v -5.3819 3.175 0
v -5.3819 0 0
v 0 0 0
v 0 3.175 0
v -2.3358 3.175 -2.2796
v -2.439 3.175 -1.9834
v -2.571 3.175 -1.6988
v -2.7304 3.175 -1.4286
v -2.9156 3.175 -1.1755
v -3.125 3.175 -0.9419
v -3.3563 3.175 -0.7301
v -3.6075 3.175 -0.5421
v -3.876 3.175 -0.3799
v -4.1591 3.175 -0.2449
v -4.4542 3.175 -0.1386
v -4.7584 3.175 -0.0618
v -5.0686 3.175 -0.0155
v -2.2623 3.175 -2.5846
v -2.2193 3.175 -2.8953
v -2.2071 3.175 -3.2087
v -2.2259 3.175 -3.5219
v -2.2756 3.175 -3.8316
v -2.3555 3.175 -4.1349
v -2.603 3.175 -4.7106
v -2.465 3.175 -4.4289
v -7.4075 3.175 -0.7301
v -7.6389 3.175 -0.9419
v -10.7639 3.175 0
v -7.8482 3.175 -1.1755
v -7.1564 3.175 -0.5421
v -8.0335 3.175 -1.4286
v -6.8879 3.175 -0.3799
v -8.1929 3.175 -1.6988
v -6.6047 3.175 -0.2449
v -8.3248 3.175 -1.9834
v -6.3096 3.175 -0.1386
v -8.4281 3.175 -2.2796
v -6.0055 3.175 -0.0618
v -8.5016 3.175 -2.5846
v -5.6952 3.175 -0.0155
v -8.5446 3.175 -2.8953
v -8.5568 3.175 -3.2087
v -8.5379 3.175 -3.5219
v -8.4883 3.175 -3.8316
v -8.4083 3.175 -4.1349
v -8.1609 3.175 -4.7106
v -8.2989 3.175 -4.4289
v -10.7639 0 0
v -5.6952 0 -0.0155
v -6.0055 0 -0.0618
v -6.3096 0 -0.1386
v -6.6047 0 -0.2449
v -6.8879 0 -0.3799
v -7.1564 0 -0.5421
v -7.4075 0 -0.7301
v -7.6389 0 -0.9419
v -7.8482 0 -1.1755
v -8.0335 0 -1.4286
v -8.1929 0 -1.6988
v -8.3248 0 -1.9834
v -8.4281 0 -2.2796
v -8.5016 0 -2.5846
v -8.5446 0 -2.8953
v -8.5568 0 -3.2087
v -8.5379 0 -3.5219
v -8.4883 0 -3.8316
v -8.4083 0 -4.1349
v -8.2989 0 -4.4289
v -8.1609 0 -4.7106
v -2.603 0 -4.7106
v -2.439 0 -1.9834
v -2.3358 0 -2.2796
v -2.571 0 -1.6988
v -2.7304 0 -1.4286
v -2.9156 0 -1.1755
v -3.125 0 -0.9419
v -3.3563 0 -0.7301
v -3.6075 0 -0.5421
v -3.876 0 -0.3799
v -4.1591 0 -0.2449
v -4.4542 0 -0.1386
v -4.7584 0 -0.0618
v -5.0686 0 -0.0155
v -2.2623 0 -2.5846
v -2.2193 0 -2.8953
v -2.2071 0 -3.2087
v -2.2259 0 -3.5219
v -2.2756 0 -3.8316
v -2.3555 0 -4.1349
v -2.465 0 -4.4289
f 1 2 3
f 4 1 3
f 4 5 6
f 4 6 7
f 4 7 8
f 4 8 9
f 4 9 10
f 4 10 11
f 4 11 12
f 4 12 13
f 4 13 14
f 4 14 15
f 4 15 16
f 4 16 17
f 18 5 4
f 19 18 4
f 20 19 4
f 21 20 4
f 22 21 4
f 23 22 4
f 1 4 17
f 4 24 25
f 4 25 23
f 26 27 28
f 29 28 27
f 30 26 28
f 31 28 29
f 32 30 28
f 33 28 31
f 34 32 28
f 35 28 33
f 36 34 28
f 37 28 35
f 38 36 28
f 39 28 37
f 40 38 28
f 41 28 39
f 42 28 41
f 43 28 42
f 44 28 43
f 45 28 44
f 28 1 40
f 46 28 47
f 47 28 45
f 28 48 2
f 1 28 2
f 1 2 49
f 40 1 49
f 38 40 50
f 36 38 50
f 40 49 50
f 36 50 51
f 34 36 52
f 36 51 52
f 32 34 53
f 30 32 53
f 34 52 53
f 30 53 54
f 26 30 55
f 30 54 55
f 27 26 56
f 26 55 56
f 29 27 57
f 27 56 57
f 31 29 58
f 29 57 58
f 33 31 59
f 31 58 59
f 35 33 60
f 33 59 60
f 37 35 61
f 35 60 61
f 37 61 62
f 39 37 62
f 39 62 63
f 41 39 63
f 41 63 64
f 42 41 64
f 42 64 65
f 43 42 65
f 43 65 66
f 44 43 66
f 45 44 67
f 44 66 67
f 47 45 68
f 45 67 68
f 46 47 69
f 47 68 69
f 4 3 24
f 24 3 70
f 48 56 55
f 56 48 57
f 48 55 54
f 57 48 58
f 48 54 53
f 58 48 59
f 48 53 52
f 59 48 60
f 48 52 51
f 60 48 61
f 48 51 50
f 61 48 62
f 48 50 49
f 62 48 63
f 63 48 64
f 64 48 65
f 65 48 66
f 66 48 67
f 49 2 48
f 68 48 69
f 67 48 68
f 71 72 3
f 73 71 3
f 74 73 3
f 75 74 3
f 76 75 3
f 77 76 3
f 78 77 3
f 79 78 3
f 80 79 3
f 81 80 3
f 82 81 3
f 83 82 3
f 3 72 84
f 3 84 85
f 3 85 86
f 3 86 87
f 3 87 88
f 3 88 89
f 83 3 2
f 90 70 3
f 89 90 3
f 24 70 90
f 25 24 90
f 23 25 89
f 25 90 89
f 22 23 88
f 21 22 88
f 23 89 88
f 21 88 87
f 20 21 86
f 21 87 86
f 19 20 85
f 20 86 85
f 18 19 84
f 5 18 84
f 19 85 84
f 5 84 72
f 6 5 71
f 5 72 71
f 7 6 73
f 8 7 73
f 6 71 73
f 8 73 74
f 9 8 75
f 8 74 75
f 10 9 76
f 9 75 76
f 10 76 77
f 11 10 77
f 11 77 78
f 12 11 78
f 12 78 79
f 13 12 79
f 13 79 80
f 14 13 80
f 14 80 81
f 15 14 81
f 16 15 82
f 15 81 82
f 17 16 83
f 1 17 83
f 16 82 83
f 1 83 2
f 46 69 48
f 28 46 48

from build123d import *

# Parameters (mm, degrees)
BOSS_EXTRUDE1_DEPTH   = 3.175
BOSS_EXTRUDE1_2_DEPTH = 3.175


with BuildPart() as part:
    # Sketch1 → Boss-Extrude1 (new body)
    with BuildSketch(Plane(origin=(0, 0, 0), x_dir=(1, 0, 0), z_dir=(0, 1, 0))):
        with BuildLine():
            Line((-10.763873207, 0), (-5.381936603, 0))
            ThreePointArc((-5.381936603, 0), (-8.116542678, 1.561756492), (-8.160888098, 4.710595517))
            Line((-8.160888098, 4.710595517), (-10.763873207, 0))
        make_face()
    extrude(amount=BOSS_EXTRUDE1_DEPTH)


with BuildPart() as body_2:
    # Sketch1 → Boss-Extrude1 2 (new body)
    with BuildSketch(Plane(origin=(0, 0, 0), x_dir=(1, 0, 0), z_dir=(0, 1, 0))):
        with BuildLine():
            Line((-5.381936603, 0), (0, 0))
            Line((0, 0), (-2.602985109, 4.710595517))
            ThreePointArc((-2.602985109, 4.710595517), (-2.647330529, 1.561756492), (-5.381936603, 0))
        make_face()
    extrude(amount=BOSS_EXTRUDE1_2_DEPTH)


solid = Compound([part.part, body_2.part])
